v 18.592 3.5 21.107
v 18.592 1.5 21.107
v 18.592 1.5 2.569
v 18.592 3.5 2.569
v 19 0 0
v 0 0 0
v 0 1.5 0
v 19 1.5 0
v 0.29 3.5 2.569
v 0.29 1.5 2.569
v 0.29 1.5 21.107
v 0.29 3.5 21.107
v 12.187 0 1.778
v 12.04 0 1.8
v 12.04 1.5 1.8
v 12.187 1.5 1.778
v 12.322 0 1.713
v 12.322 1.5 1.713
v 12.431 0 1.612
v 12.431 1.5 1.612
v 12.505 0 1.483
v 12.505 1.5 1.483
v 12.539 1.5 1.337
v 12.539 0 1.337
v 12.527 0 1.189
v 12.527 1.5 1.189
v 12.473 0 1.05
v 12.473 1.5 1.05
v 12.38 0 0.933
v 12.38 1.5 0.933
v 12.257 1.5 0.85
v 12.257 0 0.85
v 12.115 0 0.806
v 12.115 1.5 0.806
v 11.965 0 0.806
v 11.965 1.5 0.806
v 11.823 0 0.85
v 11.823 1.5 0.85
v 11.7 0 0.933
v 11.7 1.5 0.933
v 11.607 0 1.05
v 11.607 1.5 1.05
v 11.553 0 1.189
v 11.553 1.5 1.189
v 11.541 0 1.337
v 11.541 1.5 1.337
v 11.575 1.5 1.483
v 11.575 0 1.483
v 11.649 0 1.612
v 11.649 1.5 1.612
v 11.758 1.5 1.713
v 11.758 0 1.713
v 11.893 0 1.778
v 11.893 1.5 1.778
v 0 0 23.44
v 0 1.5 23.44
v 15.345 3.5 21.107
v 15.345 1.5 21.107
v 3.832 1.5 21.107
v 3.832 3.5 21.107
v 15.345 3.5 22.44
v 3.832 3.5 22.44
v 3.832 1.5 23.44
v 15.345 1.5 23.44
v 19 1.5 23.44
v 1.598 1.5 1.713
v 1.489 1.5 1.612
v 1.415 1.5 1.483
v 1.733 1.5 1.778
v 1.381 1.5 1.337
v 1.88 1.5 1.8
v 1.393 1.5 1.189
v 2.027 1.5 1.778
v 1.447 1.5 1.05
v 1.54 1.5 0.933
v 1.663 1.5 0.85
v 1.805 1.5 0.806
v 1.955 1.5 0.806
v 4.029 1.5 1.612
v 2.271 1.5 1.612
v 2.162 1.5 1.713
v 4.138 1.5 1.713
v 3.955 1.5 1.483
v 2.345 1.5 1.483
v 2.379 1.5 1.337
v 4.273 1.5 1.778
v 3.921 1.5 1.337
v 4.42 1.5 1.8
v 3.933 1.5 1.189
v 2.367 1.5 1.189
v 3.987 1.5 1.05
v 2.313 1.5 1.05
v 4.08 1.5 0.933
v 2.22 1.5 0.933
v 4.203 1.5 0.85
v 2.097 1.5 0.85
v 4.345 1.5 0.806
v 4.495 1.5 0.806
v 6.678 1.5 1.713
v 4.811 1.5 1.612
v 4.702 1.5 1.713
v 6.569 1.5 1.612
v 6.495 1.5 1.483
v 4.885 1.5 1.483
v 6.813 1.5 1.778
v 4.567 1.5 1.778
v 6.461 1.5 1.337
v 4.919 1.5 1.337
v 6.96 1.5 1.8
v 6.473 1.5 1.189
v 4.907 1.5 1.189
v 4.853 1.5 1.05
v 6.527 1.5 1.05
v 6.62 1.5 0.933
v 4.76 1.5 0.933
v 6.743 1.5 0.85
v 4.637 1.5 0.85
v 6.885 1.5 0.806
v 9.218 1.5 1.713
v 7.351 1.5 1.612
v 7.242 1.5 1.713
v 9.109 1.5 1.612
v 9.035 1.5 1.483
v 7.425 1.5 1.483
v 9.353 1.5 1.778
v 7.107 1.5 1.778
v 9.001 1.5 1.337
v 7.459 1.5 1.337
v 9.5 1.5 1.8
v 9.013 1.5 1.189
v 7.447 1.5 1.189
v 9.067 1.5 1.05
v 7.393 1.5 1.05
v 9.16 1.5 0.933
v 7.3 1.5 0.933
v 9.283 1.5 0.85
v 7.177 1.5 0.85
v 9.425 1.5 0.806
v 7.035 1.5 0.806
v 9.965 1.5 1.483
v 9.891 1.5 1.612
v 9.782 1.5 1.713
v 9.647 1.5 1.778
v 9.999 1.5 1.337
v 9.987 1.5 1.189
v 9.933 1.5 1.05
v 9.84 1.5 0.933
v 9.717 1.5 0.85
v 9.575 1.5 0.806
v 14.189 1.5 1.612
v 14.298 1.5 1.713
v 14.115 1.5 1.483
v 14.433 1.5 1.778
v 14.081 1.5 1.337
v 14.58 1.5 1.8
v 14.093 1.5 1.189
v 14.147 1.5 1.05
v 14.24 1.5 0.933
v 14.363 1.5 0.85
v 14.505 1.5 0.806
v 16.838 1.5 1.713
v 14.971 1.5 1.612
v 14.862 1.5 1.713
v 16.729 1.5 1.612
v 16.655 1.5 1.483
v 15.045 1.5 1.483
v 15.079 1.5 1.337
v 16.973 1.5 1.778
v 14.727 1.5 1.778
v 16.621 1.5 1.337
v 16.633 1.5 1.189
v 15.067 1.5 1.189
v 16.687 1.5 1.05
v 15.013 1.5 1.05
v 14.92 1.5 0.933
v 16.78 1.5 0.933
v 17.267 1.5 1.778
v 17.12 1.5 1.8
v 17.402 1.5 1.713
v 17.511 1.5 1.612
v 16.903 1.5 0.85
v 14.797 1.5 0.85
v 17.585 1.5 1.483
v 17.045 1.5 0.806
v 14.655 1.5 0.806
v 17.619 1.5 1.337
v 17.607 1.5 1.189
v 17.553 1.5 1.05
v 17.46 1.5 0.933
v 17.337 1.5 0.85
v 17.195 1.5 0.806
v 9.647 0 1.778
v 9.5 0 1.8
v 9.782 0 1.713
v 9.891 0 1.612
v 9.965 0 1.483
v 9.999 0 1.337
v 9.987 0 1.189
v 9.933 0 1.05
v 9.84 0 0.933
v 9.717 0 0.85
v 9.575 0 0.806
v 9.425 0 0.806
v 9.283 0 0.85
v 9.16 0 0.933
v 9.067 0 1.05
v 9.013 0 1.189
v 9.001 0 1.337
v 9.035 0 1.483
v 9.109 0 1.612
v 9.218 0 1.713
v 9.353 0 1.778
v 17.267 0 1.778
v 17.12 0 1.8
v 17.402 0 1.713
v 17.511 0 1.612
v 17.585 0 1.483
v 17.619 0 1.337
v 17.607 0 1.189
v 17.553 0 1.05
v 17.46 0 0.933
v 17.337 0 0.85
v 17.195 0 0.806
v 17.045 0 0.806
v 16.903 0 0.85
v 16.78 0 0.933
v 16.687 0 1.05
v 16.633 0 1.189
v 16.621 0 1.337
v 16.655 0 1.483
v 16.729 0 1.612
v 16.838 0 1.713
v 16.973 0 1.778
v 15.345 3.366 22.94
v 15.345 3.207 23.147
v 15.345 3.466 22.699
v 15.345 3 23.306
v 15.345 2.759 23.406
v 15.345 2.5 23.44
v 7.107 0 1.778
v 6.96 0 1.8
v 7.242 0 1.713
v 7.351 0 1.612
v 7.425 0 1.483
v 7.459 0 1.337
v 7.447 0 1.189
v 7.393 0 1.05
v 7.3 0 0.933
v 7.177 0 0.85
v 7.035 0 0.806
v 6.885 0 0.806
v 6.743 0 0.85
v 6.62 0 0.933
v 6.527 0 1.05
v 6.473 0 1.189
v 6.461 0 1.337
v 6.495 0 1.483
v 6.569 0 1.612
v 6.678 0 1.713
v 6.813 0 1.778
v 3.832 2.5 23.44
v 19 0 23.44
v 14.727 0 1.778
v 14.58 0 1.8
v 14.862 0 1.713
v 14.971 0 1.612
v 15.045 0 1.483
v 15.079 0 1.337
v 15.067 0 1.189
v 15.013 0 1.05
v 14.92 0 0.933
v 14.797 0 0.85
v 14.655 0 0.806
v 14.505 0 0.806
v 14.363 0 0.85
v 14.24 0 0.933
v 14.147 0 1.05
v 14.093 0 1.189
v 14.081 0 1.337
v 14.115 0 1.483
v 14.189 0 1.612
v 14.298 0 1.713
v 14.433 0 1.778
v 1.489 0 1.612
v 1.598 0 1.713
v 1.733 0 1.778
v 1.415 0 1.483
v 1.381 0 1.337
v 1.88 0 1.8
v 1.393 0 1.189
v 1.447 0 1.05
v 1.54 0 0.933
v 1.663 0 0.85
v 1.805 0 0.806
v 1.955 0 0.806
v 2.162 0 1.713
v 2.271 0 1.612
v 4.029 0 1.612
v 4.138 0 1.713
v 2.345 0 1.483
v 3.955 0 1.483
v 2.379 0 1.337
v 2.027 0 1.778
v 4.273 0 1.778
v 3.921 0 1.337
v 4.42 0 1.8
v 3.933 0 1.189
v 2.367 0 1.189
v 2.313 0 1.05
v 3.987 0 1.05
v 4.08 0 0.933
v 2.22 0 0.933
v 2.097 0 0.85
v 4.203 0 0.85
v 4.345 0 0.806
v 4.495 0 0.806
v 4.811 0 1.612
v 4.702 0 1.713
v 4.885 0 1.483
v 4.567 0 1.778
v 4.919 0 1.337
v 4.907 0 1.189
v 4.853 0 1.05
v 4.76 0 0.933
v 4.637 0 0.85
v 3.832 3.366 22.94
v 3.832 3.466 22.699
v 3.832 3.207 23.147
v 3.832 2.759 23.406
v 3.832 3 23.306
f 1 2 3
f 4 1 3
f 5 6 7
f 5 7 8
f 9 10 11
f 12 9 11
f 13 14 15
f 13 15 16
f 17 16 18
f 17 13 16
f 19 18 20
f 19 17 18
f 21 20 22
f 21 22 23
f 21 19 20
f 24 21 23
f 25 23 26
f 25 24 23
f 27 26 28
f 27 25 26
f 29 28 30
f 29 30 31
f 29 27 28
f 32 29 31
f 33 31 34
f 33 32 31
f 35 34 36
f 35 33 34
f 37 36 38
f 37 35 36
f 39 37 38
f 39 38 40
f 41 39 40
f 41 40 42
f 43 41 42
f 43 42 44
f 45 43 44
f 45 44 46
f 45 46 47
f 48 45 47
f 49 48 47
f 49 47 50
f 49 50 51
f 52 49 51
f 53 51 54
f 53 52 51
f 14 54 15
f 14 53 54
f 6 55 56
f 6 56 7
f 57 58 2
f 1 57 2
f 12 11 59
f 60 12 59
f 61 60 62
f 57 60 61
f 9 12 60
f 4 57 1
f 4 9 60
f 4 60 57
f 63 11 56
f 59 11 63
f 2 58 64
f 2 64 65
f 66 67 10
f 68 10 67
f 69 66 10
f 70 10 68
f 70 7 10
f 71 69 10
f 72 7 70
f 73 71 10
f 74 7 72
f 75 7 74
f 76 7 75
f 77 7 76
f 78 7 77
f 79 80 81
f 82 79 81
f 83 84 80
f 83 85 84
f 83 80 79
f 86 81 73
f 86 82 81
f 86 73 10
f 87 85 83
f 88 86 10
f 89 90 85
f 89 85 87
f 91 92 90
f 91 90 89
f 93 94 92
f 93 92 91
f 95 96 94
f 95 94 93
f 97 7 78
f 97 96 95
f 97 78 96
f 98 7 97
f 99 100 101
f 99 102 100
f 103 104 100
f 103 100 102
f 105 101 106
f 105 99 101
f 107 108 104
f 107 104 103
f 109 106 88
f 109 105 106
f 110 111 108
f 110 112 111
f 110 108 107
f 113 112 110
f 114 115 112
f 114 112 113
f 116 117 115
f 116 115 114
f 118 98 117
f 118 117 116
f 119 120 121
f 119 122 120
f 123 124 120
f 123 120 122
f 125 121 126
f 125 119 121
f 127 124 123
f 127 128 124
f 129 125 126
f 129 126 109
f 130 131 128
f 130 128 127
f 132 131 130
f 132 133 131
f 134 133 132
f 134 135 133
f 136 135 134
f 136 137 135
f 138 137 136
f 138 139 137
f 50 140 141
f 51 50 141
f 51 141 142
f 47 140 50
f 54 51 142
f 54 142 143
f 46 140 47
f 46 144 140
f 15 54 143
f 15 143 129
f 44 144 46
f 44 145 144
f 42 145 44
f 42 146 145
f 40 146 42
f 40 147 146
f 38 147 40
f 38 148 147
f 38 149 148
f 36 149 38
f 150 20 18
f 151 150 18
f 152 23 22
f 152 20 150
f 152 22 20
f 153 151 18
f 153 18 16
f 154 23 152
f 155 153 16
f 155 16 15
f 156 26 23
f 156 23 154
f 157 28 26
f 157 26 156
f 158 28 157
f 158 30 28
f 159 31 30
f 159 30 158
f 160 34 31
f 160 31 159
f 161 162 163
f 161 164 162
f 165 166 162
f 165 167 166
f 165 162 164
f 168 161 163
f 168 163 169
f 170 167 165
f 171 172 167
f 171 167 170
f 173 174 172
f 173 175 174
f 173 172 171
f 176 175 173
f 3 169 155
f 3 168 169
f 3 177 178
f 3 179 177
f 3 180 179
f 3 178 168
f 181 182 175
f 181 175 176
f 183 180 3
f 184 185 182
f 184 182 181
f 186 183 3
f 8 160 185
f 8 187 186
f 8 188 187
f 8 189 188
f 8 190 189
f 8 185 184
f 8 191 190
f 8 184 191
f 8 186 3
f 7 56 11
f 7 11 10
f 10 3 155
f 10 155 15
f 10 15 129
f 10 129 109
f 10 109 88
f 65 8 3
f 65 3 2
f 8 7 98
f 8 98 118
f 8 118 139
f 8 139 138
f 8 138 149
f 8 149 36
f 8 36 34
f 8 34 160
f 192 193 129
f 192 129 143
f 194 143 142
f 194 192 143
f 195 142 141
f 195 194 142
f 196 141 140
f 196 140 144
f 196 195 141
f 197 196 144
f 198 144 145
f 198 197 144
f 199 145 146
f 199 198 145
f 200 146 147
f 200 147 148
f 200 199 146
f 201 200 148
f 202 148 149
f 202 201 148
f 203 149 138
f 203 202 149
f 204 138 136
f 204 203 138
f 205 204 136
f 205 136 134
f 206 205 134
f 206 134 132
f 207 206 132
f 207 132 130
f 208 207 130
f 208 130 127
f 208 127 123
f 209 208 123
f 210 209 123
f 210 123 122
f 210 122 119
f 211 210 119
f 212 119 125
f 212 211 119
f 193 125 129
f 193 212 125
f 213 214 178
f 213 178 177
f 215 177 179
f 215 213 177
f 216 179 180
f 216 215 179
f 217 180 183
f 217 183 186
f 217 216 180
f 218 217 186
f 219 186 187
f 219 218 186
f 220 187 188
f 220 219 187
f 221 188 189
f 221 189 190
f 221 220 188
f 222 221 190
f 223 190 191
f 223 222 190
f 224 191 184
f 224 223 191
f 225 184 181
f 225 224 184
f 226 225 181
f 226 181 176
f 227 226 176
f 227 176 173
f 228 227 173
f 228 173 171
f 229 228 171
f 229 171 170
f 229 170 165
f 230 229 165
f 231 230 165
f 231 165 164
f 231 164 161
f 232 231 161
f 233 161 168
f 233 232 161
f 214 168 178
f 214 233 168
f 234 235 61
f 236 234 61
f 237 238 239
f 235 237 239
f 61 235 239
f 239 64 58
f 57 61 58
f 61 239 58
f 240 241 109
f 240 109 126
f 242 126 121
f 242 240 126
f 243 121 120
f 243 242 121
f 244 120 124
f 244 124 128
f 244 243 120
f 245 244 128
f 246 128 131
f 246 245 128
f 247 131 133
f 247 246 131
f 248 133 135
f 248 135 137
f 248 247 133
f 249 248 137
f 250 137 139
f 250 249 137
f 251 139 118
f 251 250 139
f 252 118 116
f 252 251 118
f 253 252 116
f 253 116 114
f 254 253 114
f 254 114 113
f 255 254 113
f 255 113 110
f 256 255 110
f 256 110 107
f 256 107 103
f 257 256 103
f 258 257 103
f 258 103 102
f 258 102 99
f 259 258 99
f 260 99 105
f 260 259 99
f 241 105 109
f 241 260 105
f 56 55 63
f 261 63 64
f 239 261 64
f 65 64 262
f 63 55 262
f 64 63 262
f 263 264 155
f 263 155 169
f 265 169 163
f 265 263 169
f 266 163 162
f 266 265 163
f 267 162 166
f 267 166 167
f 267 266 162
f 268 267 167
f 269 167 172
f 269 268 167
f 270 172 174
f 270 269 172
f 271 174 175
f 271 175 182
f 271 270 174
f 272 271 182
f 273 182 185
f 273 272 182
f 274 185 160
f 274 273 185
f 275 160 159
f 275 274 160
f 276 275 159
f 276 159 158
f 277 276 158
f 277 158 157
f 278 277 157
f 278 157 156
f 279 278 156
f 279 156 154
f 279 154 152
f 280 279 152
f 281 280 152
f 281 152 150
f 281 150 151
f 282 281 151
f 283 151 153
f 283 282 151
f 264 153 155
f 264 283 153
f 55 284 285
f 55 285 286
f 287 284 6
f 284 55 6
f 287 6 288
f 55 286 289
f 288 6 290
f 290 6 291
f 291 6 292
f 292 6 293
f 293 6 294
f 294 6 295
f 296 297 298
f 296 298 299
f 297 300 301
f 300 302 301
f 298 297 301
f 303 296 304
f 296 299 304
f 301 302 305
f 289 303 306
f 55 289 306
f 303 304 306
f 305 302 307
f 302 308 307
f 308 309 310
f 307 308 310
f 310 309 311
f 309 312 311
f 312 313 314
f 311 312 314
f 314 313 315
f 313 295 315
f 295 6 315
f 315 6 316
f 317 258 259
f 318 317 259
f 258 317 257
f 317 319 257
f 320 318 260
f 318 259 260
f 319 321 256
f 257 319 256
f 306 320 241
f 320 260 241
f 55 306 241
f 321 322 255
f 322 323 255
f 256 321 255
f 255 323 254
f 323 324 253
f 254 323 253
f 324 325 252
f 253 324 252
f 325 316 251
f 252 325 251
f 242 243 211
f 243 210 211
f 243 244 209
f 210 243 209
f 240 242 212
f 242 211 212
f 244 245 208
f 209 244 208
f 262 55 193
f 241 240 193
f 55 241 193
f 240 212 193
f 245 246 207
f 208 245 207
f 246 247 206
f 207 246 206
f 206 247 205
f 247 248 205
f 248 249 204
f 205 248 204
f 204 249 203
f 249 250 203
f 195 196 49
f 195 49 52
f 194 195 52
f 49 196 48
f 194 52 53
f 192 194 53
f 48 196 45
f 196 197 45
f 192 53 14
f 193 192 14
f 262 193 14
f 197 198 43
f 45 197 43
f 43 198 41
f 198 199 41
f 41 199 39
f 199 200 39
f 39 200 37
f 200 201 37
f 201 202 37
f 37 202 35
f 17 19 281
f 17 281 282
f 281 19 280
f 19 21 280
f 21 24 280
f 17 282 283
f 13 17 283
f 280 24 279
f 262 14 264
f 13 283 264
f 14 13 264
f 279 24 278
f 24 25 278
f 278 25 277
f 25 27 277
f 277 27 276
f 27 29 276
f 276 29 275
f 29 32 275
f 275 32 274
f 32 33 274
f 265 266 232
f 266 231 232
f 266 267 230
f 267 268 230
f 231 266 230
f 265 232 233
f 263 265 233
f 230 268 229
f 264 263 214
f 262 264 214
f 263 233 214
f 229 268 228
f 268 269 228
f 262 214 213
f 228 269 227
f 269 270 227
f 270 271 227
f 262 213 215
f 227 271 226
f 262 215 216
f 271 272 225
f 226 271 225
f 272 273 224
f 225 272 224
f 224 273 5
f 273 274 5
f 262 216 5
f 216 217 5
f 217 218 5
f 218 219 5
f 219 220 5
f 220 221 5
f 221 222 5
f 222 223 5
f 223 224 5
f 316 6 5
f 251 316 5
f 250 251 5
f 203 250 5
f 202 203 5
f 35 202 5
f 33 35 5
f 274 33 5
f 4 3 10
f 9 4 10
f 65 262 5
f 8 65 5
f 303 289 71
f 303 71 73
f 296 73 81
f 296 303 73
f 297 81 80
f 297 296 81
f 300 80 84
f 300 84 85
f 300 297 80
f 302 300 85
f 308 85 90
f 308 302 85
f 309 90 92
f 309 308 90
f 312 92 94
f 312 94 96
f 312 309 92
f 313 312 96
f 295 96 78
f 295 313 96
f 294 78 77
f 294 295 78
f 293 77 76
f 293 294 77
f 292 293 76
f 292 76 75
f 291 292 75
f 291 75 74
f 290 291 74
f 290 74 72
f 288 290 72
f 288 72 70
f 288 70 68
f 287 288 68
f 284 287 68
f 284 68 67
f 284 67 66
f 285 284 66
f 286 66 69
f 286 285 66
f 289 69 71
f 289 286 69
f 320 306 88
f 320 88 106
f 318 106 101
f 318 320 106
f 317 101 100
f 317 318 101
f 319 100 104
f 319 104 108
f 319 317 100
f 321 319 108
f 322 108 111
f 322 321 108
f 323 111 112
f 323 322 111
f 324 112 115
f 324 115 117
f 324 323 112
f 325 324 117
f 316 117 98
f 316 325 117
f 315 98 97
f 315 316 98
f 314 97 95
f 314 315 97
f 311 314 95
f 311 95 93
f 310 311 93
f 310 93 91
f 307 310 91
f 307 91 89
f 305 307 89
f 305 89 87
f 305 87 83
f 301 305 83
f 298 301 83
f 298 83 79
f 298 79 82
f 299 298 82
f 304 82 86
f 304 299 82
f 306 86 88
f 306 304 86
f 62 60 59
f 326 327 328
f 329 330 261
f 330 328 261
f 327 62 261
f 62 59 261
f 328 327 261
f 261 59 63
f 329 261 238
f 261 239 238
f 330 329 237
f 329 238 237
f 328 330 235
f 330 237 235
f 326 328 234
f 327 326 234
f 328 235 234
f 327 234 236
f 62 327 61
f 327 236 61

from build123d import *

# Parameters (mm, degrees)
SKETCH1_W           = 19
SKETCH1_H           = 23.44
SKETCH1_R           = 0.5
BOSS_EXTRUDE1_DEPTH = 1.5
BOSS_EXTRUDE2_DEPTH = 2
FILLET1_R           = 1


with BuildPart() as part:
    # Sketch1 → Boss-Extrude1 (new body)
    with BuildSketch(Plane(origin=(0, 0, 0), x_dir=(1, 0, 0), z_dir=(0, 1, 0))):
        with Locations((9.5, -11.72)):
            Rectangle(SKETCH1_W, SKETCH1_H)
        with Locations(Location((1.88, -1.3, 0), (0, 0, 270))):
            Circle(SKETCH1_R, mode=Mode.SUBTRACT)
        with Locations(Location((4.42, -1.3, 0), (0, 0, 270))):
            Circle(SKETCH1_R, mode=Mode.SUBTRACT)
        with Locations(Location((6.96, -1.3, 0), (0, 0, 270))):
            Circle(SKETCH1_R, mode=Mode.SUBTRACT)
        with Locations(Location((9.5, -1.3, 0), (0, 0, 270))):
            Circle(SKETCH1_R, mode=Mode.SUBTRACT)
        with Locations(Location((12.04, -1.3, 0), (0, 0, 270))):
            Circle(SKETCH1_R, mode=Mode.SUBTRACT)
        with Locations(Location((14.58, -1.3, 0), (0, 0, 270))):
            Circle(SKETCH1_R, mode=Mode.SUBTRACT)
        with Locations(Location((17.12, -1.3, 0), (0, 0, 270))):
            Circle(SKETCH1_R, mode=Mode.SUBTRACT)
    extrude(amount=BOSS_EXTRUDE1_DEPTH)

    # Sketch3 → Boss-Extrude2 (add)
    with BuildSketch(Plane(origin=(0, 1.5, 0), x_dir=(1, 0, 0), z_dir=(0, 1, 0))):
        Polygon((3.832385917, -21.106985825), (3.832385917, -23.44), (15.344727023, -23.44), (15.344727023, -21.106985825), (18.591797592, -21.106985825), (18.591797592, -2.569164761), (0.290127115, -2.569164761), (0.290127115, -21.106985825), align=None)
    extrude(amount=BOSS_EXTRUDE2_DEPTH)

    # Fillet1
    fillet1_edges = [part.edges().sort_by_distance(p)[0] for p in [
        (9.58855647, 3.5, 23.44),
    ]]
    fillet(fillet1_edges, radius=FILLET1_R)


solid = part.part
